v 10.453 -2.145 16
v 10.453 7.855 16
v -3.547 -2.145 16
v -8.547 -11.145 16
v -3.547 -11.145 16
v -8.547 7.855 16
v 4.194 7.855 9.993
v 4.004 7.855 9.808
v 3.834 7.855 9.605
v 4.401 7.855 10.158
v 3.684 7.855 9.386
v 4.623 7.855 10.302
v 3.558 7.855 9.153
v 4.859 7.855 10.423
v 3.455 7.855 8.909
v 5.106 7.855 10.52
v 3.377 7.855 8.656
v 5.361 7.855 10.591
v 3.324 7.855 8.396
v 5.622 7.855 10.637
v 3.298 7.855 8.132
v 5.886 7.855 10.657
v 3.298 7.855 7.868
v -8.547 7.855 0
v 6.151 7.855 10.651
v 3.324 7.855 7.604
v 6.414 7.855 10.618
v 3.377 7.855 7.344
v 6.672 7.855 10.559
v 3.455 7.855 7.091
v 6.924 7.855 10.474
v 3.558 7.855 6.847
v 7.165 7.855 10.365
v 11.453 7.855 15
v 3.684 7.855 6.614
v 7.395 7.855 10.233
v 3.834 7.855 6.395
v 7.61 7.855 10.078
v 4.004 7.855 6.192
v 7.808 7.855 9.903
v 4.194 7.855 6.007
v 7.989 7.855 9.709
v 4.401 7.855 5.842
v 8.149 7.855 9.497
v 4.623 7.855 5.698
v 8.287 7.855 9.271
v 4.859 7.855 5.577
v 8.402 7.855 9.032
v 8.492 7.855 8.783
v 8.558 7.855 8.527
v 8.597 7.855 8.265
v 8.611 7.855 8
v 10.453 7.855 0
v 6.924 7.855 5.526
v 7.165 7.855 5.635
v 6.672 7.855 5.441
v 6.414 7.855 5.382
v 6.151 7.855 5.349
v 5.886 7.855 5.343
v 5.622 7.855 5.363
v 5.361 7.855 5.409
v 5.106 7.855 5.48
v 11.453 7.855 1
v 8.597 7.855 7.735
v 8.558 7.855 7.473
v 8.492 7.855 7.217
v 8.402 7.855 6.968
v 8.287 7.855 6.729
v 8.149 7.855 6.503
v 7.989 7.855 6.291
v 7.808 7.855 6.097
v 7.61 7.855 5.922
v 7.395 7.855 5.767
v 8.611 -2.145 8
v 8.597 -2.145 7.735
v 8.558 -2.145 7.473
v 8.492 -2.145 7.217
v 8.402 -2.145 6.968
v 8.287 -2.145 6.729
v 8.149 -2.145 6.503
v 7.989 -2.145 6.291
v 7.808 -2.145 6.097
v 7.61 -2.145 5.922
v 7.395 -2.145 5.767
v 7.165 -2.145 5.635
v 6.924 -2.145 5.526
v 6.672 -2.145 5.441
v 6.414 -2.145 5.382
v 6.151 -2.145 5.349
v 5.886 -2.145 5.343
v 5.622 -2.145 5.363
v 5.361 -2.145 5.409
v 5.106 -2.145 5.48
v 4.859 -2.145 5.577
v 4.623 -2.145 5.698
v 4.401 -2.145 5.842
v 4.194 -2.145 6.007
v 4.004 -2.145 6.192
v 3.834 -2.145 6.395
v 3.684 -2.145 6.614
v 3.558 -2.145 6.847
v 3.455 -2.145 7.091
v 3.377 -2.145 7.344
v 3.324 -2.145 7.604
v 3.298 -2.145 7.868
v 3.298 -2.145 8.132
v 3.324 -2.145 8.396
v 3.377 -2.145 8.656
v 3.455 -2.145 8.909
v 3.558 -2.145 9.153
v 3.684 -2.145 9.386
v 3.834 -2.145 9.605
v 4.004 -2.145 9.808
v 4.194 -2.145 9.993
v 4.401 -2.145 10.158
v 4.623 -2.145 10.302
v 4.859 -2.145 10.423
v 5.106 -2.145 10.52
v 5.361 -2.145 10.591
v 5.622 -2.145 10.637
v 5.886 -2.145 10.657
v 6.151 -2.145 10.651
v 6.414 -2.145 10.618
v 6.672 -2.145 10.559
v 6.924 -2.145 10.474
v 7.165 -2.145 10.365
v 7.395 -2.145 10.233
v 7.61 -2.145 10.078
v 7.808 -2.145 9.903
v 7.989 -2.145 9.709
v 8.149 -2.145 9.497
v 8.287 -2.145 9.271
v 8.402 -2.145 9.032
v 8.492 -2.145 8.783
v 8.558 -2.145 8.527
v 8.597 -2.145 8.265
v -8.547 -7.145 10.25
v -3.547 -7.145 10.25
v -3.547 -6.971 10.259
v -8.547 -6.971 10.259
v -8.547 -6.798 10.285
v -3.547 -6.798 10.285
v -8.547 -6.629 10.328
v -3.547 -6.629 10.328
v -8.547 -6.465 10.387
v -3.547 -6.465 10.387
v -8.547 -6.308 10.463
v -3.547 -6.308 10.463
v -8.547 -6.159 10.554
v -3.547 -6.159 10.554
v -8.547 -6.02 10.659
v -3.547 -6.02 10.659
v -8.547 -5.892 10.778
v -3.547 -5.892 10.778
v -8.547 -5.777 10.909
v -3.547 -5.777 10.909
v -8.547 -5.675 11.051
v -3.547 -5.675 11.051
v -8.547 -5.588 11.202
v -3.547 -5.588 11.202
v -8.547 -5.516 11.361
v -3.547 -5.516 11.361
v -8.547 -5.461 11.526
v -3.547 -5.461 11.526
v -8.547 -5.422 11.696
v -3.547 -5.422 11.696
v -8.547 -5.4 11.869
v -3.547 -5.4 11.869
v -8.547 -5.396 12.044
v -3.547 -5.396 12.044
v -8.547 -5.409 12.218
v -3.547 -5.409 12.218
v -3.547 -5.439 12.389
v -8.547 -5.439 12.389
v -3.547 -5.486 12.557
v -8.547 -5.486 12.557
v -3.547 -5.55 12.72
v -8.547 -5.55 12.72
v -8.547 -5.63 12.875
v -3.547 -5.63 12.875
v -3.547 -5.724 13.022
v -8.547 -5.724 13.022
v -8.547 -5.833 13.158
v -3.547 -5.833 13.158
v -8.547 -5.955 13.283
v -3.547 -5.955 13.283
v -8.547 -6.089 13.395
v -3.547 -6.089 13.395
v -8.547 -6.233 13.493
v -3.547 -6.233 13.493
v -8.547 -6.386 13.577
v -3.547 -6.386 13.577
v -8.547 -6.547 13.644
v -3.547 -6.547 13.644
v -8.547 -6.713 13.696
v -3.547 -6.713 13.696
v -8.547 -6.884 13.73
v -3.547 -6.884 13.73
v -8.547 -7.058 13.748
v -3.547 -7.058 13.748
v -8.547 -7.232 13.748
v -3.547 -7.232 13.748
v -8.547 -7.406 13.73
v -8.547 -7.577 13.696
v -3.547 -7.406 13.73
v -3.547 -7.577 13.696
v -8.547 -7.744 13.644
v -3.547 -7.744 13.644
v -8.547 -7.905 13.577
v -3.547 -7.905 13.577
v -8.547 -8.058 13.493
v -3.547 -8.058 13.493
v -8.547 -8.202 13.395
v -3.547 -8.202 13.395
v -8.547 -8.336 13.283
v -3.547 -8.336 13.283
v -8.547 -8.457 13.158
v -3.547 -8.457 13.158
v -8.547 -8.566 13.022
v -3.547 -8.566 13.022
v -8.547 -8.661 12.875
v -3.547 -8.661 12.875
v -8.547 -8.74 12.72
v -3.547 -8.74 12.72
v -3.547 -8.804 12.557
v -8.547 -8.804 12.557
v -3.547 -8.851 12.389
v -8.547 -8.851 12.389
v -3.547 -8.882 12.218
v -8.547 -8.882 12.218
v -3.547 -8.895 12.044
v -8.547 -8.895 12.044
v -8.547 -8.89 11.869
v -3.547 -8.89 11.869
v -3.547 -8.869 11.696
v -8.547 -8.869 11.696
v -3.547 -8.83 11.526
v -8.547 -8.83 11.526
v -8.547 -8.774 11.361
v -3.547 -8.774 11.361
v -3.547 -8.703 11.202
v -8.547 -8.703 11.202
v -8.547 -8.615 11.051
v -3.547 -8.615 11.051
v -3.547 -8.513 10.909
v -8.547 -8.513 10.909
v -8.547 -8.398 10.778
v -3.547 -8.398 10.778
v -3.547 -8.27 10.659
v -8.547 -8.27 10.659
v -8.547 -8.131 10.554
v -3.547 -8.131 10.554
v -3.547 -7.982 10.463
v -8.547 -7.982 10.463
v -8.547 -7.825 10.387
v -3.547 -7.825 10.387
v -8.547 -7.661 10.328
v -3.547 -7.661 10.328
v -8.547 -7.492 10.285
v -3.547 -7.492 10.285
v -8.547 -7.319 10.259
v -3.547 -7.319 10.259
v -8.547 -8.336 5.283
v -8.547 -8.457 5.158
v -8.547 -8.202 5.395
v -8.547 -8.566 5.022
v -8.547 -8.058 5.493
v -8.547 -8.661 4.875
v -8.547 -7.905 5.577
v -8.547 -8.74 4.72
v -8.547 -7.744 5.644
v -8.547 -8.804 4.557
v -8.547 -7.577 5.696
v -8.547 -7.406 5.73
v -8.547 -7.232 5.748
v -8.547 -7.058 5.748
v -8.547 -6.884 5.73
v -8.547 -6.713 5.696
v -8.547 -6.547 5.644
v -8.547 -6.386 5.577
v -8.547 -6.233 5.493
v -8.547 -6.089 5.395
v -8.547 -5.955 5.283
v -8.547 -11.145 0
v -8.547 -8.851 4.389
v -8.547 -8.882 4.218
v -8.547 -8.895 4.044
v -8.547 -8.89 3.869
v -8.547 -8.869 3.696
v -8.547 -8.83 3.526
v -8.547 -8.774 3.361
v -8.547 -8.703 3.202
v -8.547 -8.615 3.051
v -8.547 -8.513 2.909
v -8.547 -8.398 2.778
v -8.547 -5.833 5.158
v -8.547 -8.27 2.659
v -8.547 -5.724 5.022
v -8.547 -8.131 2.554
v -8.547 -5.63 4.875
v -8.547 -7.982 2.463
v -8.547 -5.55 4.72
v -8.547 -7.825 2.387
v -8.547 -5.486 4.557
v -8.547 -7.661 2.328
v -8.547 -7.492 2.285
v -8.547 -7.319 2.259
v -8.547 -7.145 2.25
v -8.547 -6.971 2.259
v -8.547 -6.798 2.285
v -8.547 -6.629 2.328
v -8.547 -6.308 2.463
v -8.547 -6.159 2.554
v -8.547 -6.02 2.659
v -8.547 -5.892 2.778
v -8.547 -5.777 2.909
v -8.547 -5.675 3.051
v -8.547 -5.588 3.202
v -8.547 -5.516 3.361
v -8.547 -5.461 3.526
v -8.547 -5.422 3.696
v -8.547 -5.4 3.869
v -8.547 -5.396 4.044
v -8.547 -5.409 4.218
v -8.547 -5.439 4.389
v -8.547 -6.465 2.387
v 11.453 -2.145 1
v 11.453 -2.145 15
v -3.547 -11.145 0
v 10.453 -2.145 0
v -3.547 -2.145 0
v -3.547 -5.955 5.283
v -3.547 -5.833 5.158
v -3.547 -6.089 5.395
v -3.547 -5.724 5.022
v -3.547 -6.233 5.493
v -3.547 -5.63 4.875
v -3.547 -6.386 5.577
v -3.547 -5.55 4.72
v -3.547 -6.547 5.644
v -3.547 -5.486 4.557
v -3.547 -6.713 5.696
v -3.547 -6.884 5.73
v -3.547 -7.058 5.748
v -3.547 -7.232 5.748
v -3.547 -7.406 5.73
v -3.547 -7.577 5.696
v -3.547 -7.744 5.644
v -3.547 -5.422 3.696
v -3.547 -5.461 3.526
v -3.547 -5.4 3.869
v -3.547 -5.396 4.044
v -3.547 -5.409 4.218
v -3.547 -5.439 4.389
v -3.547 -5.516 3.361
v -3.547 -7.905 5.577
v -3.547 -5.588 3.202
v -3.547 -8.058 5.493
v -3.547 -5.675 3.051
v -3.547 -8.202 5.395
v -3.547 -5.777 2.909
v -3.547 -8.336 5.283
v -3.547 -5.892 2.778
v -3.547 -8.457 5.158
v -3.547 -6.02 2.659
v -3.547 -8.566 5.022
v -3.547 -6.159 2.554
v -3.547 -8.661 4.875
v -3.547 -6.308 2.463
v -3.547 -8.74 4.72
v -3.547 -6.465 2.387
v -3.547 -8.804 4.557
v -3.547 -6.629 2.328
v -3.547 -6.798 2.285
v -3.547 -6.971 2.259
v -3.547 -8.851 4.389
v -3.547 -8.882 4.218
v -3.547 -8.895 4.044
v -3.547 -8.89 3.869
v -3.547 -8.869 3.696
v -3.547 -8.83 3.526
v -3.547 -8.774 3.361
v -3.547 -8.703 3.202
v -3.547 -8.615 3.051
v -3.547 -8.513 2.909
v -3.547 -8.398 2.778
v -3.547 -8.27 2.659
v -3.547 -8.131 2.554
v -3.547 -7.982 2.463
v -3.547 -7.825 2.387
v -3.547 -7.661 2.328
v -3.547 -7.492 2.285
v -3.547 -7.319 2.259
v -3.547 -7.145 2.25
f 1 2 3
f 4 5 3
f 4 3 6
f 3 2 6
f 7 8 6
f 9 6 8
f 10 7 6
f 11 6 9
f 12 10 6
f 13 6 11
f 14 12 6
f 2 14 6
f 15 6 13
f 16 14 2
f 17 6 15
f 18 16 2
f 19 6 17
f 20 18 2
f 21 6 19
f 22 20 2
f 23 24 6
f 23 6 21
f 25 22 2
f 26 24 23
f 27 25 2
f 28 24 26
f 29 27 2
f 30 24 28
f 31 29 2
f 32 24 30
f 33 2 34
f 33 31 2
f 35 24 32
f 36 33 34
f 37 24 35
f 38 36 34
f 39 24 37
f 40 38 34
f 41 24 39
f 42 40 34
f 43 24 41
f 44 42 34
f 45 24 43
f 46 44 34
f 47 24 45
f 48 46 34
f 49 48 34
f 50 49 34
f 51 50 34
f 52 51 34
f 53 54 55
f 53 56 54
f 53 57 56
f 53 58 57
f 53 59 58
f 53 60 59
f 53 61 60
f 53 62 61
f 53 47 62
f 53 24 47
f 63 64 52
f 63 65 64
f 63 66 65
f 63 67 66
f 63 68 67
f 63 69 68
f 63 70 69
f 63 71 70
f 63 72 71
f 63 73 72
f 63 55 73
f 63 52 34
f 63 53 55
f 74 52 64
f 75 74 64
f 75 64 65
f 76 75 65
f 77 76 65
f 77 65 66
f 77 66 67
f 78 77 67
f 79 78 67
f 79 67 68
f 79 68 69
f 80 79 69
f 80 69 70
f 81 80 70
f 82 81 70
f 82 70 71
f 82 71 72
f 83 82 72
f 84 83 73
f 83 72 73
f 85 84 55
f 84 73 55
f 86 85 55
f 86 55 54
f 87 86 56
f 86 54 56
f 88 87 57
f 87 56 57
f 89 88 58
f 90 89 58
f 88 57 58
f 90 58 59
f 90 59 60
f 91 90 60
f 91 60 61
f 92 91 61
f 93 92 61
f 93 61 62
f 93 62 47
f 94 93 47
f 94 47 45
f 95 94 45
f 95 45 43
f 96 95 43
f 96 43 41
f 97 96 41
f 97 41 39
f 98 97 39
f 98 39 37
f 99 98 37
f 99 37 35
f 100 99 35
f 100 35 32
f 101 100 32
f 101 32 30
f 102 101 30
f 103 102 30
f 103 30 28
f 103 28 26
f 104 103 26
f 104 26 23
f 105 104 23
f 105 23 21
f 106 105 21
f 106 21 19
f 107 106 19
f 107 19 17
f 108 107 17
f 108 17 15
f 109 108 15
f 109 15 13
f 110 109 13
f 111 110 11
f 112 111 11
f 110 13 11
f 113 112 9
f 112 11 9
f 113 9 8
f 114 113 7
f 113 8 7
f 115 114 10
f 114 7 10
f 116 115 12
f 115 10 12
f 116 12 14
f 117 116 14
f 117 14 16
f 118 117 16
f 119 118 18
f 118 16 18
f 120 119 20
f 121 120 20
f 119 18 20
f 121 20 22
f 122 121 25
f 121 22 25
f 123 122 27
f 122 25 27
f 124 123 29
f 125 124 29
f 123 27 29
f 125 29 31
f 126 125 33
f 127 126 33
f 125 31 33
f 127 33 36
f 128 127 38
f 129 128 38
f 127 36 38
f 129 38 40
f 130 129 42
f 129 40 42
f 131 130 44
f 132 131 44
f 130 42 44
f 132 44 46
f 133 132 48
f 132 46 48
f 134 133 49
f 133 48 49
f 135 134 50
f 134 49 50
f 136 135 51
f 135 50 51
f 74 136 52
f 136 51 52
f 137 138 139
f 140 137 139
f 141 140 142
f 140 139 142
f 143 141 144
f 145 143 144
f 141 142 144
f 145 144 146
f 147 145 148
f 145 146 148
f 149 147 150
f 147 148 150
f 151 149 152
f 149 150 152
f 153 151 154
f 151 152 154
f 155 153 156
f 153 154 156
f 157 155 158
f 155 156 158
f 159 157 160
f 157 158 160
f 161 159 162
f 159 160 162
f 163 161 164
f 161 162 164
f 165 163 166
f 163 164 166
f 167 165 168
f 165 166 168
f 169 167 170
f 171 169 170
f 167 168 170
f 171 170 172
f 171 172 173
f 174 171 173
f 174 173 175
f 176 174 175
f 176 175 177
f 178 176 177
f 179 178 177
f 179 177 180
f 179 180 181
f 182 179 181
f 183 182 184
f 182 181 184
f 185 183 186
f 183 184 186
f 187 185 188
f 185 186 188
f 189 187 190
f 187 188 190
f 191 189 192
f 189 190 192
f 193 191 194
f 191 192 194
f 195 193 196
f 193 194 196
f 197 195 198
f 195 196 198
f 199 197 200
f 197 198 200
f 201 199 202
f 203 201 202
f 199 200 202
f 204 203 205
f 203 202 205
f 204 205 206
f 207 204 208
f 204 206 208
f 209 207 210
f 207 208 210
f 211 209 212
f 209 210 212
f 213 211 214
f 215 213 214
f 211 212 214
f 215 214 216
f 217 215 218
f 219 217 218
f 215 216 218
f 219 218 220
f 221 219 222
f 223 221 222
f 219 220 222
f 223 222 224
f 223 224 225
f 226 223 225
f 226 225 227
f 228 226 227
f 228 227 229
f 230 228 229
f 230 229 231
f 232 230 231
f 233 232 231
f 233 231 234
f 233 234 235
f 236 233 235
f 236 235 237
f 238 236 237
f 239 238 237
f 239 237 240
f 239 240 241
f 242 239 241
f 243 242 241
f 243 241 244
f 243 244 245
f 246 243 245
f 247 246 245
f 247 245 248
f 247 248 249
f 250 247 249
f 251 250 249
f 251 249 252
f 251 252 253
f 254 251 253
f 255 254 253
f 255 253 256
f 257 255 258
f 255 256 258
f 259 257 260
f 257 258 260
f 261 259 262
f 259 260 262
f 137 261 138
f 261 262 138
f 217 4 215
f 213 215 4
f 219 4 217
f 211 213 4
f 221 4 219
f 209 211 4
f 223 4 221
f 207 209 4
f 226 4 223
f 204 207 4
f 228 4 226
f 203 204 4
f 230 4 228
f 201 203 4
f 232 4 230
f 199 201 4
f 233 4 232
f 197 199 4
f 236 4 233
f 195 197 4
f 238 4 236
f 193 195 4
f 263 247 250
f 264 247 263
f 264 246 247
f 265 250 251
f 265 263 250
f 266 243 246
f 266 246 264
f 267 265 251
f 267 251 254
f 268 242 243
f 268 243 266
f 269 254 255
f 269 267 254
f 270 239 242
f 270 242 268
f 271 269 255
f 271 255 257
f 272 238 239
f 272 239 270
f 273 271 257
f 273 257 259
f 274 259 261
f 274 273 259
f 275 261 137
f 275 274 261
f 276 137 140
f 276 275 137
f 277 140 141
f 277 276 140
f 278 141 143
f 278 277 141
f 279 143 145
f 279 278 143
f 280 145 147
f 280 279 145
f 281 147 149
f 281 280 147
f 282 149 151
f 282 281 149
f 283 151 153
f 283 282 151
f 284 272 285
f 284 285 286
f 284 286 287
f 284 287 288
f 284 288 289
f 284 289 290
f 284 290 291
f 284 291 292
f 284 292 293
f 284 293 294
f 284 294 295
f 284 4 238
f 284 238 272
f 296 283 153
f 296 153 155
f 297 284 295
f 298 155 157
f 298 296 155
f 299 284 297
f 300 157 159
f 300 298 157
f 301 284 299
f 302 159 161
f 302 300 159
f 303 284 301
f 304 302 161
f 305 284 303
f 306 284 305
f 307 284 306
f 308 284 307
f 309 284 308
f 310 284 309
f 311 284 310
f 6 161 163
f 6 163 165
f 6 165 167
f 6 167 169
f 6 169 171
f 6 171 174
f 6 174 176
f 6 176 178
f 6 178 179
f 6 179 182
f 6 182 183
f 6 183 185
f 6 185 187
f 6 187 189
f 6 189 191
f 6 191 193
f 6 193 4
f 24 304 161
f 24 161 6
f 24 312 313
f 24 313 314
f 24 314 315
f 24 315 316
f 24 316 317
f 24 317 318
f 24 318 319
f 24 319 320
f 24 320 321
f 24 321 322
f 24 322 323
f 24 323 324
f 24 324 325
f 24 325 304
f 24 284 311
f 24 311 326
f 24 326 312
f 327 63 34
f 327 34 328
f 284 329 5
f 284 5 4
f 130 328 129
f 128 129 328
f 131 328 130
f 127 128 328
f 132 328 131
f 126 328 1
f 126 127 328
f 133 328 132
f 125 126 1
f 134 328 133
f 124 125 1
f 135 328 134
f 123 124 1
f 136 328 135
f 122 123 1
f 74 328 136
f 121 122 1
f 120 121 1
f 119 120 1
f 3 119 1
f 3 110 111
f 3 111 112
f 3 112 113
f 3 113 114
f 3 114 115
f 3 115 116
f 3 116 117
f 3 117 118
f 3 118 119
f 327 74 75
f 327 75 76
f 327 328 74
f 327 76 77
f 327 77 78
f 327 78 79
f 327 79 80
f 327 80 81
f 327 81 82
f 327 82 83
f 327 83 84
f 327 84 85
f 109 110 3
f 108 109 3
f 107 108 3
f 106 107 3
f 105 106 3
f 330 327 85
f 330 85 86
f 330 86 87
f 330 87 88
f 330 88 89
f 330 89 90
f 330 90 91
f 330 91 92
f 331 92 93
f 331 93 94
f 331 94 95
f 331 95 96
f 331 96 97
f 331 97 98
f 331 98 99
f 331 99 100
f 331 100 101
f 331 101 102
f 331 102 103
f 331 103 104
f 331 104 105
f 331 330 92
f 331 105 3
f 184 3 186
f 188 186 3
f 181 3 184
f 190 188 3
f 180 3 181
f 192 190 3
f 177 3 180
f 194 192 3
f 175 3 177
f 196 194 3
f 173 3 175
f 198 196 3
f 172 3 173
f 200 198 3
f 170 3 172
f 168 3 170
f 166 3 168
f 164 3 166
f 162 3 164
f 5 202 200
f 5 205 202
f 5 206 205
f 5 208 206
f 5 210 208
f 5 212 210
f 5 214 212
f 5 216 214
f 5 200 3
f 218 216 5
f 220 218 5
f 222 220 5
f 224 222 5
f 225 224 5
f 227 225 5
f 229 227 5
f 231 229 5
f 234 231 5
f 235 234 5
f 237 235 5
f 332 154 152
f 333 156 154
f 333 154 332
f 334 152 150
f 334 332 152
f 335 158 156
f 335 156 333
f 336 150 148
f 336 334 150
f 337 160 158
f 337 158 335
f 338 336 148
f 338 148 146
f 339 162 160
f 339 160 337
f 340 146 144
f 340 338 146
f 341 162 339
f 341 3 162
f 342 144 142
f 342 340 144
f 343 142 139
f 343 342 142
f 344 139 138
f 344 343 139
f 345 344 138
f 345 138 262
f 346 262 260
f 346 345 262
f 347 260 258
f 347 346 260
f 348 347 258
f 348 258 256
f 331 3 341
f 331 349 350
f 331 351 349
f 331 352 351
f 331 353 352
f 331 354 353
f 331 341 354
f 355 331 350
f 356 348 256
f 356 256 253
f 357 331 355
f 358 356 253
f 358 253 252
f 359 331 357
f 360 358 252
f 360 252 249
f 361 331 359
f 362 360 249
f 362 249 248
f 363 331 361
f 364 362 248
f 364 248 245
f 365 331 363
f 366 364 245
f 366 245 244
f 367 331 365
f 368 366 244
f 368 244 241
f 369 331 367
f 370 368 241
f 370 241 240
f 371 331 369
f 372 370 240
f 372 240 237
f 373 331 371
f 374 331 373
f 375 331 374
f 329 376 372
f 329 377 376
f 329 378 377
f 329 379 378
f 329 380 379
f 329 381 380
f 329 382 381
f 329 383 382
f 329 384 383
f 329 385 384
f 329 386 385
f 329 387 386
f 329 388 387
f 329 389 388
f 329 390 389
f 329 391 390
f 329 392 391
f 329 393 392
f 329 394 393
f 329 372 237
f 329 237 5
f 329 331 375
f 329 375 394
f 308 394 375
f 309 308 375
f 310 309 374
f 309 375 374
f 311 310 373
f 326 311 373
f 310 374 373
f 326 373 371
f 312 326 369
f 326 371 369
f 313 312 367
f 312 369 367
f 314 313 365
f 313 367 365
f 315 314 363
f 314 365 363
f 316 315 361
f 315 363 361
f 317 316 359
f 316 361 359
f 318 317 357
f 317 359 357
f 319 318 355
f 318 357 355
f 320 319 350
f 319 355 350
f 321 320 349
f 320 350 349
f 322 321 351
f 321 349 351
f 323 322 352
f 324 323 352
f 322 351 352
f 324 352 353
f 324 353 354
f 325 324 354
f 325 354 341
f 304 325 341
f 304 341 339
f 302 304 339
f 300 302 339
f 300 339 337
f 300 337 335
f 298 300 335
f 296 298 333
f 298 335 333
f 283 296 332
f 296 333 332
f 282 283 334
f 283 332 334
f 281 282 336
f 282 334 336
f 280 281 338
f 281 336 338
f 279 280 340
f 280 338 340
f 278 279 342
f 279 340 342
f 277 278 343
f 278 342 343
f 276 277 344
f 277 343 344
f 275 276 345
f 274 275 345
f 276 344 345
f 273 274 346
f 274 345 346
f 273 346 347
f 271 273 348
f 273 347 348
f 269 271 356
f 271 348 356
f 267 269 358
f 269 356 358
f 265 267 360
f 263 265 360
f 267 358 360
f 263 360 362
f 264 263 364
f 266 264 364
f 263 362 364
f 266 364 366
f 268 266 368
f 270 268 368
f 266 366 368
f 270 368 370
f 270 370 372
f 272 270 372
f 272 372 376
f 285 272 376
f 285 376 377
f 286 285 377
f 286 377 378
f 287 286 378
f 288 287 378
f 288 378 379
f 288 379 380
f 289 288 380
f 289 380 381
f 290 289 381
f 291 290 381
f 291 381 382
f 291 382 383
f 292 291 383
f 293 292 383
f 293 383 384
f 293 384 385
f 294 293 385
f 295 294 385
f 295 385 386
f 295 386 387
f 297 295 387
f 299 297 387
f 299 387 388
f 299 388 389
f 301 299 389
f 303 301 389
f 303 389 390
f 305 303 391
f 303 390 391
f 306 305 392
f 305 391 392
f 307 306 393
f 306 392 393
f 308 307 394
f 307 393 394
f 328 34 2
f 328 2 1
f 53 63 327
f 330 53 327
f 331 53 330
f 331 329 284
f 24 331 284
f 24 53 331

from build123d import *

# Parameters (mm, degrees)
BOSS_EXTRUDE1_DEPTH = 16
SKETCH2_R           = 2.658036829
CUT_EXTRUDE1_DEPTH  = 16
SKETCH3_R           = 1.75
CUT_EXTRUDE2_DEPTH  = 5
CHAMFER1_SIZE       = 1


with BuildPart() as part:
    # Sketch1 → Boss-Extrude1 (new body)
    with BuildSketch(Plane.XY):
        Polygon((-8.547486034, 7.854748603), (11.452513966, 7.854748603), (11.452513966, -2.145251397), (-3.547486034, -2.145251397), (-3.547486034, -11.145251397), (-8.547486034, -11.145251397), align=None)
    extrude(amount=BOSS_EXTRUDE1_DEPTH)

    # Sketch2 → Cut-Extrude1 (cut)
    with BuildSketch(Plane(origin=(0, 7.854748603, 0), x_dir=(1, 0, 0), z_dir=(0, 1, 0))):
        with Locations((5.952513966, -8)):
            Circle(SKETCH2_R)
    extrude(amount=-CUT_EXTRUDE1_DEPTH, mode=Mode.SUBTRACT)

    # Sketch3 → Cut-Extrude2 (cut)
    with BuildSketch(Plane(origin=(-3.547486034, 0, 0), x_dir=(0, 0, -1), z_dir=(1, 0, 0))):
        with Locations((-12, -7.145251397)):
            Circle(SKETCH3_R)
        with Locations((-4, -7.145251397)):
            Circle(SKETCH3_R)
    extrude(amount=-CUT_EXTRUDE2_DEPTH, mode=Mode.SUBTRACT)

    # Chamfer1
    chamfer1_edges = [part.edges().sort_by_distance(p)[0] for p in [
        (11.452513966, 2.854748603, 16),
        (11.452513966, 2.854748603, 0),
    ]]
    chamfer(chamfer1_edges, length=CHAMFER1_SIZE)


solid = part.part
